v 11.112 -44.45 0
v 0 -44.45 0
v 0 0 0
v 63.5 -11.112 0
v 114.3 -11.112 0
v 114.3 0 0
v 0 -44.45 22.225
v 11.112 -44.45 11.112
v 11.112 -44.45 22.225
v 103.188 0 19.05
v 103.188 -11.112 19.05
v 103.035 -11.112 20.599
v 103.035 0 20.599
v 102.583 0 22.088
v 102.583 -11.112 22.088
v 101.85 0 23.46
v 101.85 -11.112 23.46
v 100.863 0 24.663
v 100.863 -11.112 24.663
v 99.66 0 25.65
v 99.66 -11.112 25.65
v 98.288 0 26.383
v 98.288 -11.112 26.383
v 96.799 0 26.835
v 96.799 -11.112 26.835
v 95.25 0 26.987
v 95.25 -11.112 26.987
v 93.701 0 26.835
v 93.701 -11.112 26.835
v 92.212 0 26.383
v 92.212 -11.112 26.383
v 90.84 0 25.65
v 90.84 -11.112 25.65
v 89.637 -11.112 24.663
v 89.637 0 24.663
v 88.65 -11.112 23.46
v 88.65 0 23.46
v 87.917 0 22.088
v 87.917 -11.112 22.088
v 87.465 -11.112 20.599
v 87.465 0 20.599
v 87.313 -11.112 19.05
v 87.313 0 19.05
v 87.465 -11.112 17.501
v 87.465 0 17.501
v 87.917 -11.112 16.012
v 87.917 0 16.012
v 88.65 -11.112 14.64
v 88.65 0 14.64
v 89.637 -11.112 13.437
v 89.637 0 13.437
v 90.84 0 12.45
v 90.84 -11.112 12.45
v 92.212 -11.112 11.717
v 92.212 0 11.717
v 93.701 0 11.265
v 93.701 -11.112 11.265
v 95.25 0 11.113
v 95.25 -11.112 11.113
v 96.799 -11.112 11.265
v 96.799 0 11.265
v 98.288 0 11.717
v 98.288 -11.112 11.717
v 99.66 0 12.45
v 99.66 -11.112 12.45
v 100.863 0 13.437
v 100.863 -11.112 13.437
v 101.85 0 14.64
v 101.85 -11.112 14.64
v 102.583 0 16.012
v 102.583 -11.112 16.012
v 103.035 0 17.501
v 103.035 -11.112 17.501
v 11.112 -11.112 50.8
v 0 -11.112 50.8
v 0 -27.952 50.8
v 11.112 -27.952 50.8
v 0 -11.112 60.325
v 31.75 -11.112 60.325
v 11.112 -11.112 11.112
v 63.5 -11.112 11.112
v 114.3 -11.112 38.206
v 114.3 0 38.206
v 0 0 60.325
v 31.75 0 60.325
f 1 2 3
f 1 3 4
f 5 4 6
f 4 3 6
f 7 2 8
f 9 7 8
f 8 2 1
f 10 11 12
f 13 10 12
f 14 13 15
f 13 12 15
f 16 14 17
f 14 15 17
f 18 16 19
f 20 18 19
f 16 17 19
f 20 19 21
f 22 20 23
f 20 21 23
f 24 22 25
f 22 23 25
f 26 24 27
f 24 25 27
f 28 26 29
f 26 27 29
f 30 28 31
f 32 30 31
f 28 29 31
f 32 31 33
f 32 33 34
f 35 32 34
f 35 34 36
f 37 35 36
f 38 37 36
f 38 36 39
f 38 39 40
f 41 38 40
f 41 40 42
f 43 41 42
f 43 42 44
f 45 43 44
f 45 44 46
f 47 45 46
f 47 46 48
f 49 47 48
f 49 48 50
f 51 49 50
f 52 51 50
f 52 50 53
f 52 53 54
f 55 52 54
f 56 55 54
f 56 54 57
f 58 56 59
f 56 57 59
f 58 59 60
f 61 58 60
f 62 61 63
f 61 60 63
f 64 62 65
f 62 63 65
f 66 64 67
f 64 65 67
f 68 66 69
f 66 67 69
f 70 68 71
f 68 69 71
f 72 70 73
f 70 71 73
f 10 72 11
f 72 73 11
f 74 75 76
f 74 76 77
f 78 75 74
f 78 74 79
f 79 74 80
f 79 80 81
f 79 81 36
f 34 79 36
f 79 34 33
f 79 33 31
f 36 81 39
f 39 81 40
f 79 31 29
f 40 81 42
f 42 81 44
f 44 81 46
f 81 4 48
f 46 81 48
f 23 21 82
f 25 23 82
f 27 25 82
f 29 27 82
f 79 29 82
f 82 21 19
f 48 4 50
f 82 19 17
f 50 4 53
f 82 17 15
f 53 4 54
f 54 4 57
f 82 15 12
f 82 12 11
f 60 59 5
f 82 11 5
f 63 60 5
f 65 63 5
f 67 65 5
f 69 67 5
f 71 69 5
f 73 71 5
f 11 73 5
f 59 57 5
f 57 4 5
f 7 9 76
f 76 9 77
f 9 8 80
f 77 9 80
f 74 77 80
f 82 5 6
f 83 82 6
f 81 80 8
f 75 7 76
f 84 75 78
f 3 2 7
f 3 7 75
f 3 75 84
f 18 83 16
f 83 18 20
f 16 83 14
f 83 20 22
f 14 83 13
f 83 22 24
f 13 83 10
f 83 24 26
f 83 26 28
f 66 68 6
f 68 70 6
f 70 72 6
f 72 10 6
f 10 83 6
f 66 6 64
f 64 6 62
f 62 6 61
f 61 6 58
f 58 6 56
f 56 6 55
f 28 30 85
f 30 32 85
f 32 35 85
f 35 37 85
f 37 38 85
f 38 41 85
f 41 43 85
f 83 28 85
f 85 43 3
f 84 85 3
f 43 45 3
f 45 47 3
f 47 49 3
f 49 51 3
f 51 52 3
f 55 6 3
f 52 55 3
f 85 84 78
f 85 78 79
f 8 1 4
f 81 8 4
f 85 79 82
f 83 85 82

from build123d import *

# Parameters (mm, degrees)
F1_DEPTH = 60.325
F2_DEPTH = 11.1125
F4_DEPTH = 11.1125
F0_W     = 11.1125
F0_H     = 33.3375
F5_DEPTH = 50.8
F6_DEPTH = 25.4
F8_DEPTH = 11.1125


with BuildPart() as f1:
    # F0 (on Top) → F1 (new body)
    with BuildSketch(Plane.XY):
        Polygon((114.3, 0), (0, 0), (0, -11.1125), (11.1125, -11.1125), (63.5, -11.1125), (114.3, -11.1125), align=None)
    extrude(amount=F1_DEPTH)

    # F0 (on Top) → F2 (join)
    with BuildSketch(Plane.XY):
        Polygon((63.5, -11.1125), (11.1125, -11.1125), (11.1125, -44.45), align=None)
    extrude(amount=F2_DEPTH)

    # F3 (on face) → F4 (cut)
    with BuildSketch(Plane.XZ.offset(11.1125)):
        Polygon((114.3, 60.325), (31.75, 60.325), (114.3, 38.205794), align=None)
    extrude(amount=-F4_DEPTH, mode=Mode.SUBTRACT)

    # F0 (on Top) → F5 (join)
    with BuildSketch(Plane.XY):
        with Locations((5.55625, -27.78125)):
            Rectangle(F0_W, F0_H)
    extrude(amount=F5_DEPTH)

    # F3 (on face) → F6 (cut)
    with BuildSketch(Plane.XZ.offset(11.1125)):
        with BuildLine():
            ThreePointArc((103.1875, 19.05), (89.63734, 24.66266), (95.25, 11.1125))
            ThreePointArc((95.25, 11.1125), (100.86266, 13.43734), (103.1875, 19.05))
        make_face()
    extrude(amount=-F6_DEPTH, mode=Mode.SUBTRACT)

    # F7 (on face) → F8 (cut)
    with BuildSketch(Plane.YZ.offset(11.1125)):
        Polygon((-44.45, 50.8), (-44.45, 22.225), (-27.952216, 50.8), align=None)
    extrude(amount=-F8_DEPTH, mode=Mode.SUBTRACT)


solid = f1.part
